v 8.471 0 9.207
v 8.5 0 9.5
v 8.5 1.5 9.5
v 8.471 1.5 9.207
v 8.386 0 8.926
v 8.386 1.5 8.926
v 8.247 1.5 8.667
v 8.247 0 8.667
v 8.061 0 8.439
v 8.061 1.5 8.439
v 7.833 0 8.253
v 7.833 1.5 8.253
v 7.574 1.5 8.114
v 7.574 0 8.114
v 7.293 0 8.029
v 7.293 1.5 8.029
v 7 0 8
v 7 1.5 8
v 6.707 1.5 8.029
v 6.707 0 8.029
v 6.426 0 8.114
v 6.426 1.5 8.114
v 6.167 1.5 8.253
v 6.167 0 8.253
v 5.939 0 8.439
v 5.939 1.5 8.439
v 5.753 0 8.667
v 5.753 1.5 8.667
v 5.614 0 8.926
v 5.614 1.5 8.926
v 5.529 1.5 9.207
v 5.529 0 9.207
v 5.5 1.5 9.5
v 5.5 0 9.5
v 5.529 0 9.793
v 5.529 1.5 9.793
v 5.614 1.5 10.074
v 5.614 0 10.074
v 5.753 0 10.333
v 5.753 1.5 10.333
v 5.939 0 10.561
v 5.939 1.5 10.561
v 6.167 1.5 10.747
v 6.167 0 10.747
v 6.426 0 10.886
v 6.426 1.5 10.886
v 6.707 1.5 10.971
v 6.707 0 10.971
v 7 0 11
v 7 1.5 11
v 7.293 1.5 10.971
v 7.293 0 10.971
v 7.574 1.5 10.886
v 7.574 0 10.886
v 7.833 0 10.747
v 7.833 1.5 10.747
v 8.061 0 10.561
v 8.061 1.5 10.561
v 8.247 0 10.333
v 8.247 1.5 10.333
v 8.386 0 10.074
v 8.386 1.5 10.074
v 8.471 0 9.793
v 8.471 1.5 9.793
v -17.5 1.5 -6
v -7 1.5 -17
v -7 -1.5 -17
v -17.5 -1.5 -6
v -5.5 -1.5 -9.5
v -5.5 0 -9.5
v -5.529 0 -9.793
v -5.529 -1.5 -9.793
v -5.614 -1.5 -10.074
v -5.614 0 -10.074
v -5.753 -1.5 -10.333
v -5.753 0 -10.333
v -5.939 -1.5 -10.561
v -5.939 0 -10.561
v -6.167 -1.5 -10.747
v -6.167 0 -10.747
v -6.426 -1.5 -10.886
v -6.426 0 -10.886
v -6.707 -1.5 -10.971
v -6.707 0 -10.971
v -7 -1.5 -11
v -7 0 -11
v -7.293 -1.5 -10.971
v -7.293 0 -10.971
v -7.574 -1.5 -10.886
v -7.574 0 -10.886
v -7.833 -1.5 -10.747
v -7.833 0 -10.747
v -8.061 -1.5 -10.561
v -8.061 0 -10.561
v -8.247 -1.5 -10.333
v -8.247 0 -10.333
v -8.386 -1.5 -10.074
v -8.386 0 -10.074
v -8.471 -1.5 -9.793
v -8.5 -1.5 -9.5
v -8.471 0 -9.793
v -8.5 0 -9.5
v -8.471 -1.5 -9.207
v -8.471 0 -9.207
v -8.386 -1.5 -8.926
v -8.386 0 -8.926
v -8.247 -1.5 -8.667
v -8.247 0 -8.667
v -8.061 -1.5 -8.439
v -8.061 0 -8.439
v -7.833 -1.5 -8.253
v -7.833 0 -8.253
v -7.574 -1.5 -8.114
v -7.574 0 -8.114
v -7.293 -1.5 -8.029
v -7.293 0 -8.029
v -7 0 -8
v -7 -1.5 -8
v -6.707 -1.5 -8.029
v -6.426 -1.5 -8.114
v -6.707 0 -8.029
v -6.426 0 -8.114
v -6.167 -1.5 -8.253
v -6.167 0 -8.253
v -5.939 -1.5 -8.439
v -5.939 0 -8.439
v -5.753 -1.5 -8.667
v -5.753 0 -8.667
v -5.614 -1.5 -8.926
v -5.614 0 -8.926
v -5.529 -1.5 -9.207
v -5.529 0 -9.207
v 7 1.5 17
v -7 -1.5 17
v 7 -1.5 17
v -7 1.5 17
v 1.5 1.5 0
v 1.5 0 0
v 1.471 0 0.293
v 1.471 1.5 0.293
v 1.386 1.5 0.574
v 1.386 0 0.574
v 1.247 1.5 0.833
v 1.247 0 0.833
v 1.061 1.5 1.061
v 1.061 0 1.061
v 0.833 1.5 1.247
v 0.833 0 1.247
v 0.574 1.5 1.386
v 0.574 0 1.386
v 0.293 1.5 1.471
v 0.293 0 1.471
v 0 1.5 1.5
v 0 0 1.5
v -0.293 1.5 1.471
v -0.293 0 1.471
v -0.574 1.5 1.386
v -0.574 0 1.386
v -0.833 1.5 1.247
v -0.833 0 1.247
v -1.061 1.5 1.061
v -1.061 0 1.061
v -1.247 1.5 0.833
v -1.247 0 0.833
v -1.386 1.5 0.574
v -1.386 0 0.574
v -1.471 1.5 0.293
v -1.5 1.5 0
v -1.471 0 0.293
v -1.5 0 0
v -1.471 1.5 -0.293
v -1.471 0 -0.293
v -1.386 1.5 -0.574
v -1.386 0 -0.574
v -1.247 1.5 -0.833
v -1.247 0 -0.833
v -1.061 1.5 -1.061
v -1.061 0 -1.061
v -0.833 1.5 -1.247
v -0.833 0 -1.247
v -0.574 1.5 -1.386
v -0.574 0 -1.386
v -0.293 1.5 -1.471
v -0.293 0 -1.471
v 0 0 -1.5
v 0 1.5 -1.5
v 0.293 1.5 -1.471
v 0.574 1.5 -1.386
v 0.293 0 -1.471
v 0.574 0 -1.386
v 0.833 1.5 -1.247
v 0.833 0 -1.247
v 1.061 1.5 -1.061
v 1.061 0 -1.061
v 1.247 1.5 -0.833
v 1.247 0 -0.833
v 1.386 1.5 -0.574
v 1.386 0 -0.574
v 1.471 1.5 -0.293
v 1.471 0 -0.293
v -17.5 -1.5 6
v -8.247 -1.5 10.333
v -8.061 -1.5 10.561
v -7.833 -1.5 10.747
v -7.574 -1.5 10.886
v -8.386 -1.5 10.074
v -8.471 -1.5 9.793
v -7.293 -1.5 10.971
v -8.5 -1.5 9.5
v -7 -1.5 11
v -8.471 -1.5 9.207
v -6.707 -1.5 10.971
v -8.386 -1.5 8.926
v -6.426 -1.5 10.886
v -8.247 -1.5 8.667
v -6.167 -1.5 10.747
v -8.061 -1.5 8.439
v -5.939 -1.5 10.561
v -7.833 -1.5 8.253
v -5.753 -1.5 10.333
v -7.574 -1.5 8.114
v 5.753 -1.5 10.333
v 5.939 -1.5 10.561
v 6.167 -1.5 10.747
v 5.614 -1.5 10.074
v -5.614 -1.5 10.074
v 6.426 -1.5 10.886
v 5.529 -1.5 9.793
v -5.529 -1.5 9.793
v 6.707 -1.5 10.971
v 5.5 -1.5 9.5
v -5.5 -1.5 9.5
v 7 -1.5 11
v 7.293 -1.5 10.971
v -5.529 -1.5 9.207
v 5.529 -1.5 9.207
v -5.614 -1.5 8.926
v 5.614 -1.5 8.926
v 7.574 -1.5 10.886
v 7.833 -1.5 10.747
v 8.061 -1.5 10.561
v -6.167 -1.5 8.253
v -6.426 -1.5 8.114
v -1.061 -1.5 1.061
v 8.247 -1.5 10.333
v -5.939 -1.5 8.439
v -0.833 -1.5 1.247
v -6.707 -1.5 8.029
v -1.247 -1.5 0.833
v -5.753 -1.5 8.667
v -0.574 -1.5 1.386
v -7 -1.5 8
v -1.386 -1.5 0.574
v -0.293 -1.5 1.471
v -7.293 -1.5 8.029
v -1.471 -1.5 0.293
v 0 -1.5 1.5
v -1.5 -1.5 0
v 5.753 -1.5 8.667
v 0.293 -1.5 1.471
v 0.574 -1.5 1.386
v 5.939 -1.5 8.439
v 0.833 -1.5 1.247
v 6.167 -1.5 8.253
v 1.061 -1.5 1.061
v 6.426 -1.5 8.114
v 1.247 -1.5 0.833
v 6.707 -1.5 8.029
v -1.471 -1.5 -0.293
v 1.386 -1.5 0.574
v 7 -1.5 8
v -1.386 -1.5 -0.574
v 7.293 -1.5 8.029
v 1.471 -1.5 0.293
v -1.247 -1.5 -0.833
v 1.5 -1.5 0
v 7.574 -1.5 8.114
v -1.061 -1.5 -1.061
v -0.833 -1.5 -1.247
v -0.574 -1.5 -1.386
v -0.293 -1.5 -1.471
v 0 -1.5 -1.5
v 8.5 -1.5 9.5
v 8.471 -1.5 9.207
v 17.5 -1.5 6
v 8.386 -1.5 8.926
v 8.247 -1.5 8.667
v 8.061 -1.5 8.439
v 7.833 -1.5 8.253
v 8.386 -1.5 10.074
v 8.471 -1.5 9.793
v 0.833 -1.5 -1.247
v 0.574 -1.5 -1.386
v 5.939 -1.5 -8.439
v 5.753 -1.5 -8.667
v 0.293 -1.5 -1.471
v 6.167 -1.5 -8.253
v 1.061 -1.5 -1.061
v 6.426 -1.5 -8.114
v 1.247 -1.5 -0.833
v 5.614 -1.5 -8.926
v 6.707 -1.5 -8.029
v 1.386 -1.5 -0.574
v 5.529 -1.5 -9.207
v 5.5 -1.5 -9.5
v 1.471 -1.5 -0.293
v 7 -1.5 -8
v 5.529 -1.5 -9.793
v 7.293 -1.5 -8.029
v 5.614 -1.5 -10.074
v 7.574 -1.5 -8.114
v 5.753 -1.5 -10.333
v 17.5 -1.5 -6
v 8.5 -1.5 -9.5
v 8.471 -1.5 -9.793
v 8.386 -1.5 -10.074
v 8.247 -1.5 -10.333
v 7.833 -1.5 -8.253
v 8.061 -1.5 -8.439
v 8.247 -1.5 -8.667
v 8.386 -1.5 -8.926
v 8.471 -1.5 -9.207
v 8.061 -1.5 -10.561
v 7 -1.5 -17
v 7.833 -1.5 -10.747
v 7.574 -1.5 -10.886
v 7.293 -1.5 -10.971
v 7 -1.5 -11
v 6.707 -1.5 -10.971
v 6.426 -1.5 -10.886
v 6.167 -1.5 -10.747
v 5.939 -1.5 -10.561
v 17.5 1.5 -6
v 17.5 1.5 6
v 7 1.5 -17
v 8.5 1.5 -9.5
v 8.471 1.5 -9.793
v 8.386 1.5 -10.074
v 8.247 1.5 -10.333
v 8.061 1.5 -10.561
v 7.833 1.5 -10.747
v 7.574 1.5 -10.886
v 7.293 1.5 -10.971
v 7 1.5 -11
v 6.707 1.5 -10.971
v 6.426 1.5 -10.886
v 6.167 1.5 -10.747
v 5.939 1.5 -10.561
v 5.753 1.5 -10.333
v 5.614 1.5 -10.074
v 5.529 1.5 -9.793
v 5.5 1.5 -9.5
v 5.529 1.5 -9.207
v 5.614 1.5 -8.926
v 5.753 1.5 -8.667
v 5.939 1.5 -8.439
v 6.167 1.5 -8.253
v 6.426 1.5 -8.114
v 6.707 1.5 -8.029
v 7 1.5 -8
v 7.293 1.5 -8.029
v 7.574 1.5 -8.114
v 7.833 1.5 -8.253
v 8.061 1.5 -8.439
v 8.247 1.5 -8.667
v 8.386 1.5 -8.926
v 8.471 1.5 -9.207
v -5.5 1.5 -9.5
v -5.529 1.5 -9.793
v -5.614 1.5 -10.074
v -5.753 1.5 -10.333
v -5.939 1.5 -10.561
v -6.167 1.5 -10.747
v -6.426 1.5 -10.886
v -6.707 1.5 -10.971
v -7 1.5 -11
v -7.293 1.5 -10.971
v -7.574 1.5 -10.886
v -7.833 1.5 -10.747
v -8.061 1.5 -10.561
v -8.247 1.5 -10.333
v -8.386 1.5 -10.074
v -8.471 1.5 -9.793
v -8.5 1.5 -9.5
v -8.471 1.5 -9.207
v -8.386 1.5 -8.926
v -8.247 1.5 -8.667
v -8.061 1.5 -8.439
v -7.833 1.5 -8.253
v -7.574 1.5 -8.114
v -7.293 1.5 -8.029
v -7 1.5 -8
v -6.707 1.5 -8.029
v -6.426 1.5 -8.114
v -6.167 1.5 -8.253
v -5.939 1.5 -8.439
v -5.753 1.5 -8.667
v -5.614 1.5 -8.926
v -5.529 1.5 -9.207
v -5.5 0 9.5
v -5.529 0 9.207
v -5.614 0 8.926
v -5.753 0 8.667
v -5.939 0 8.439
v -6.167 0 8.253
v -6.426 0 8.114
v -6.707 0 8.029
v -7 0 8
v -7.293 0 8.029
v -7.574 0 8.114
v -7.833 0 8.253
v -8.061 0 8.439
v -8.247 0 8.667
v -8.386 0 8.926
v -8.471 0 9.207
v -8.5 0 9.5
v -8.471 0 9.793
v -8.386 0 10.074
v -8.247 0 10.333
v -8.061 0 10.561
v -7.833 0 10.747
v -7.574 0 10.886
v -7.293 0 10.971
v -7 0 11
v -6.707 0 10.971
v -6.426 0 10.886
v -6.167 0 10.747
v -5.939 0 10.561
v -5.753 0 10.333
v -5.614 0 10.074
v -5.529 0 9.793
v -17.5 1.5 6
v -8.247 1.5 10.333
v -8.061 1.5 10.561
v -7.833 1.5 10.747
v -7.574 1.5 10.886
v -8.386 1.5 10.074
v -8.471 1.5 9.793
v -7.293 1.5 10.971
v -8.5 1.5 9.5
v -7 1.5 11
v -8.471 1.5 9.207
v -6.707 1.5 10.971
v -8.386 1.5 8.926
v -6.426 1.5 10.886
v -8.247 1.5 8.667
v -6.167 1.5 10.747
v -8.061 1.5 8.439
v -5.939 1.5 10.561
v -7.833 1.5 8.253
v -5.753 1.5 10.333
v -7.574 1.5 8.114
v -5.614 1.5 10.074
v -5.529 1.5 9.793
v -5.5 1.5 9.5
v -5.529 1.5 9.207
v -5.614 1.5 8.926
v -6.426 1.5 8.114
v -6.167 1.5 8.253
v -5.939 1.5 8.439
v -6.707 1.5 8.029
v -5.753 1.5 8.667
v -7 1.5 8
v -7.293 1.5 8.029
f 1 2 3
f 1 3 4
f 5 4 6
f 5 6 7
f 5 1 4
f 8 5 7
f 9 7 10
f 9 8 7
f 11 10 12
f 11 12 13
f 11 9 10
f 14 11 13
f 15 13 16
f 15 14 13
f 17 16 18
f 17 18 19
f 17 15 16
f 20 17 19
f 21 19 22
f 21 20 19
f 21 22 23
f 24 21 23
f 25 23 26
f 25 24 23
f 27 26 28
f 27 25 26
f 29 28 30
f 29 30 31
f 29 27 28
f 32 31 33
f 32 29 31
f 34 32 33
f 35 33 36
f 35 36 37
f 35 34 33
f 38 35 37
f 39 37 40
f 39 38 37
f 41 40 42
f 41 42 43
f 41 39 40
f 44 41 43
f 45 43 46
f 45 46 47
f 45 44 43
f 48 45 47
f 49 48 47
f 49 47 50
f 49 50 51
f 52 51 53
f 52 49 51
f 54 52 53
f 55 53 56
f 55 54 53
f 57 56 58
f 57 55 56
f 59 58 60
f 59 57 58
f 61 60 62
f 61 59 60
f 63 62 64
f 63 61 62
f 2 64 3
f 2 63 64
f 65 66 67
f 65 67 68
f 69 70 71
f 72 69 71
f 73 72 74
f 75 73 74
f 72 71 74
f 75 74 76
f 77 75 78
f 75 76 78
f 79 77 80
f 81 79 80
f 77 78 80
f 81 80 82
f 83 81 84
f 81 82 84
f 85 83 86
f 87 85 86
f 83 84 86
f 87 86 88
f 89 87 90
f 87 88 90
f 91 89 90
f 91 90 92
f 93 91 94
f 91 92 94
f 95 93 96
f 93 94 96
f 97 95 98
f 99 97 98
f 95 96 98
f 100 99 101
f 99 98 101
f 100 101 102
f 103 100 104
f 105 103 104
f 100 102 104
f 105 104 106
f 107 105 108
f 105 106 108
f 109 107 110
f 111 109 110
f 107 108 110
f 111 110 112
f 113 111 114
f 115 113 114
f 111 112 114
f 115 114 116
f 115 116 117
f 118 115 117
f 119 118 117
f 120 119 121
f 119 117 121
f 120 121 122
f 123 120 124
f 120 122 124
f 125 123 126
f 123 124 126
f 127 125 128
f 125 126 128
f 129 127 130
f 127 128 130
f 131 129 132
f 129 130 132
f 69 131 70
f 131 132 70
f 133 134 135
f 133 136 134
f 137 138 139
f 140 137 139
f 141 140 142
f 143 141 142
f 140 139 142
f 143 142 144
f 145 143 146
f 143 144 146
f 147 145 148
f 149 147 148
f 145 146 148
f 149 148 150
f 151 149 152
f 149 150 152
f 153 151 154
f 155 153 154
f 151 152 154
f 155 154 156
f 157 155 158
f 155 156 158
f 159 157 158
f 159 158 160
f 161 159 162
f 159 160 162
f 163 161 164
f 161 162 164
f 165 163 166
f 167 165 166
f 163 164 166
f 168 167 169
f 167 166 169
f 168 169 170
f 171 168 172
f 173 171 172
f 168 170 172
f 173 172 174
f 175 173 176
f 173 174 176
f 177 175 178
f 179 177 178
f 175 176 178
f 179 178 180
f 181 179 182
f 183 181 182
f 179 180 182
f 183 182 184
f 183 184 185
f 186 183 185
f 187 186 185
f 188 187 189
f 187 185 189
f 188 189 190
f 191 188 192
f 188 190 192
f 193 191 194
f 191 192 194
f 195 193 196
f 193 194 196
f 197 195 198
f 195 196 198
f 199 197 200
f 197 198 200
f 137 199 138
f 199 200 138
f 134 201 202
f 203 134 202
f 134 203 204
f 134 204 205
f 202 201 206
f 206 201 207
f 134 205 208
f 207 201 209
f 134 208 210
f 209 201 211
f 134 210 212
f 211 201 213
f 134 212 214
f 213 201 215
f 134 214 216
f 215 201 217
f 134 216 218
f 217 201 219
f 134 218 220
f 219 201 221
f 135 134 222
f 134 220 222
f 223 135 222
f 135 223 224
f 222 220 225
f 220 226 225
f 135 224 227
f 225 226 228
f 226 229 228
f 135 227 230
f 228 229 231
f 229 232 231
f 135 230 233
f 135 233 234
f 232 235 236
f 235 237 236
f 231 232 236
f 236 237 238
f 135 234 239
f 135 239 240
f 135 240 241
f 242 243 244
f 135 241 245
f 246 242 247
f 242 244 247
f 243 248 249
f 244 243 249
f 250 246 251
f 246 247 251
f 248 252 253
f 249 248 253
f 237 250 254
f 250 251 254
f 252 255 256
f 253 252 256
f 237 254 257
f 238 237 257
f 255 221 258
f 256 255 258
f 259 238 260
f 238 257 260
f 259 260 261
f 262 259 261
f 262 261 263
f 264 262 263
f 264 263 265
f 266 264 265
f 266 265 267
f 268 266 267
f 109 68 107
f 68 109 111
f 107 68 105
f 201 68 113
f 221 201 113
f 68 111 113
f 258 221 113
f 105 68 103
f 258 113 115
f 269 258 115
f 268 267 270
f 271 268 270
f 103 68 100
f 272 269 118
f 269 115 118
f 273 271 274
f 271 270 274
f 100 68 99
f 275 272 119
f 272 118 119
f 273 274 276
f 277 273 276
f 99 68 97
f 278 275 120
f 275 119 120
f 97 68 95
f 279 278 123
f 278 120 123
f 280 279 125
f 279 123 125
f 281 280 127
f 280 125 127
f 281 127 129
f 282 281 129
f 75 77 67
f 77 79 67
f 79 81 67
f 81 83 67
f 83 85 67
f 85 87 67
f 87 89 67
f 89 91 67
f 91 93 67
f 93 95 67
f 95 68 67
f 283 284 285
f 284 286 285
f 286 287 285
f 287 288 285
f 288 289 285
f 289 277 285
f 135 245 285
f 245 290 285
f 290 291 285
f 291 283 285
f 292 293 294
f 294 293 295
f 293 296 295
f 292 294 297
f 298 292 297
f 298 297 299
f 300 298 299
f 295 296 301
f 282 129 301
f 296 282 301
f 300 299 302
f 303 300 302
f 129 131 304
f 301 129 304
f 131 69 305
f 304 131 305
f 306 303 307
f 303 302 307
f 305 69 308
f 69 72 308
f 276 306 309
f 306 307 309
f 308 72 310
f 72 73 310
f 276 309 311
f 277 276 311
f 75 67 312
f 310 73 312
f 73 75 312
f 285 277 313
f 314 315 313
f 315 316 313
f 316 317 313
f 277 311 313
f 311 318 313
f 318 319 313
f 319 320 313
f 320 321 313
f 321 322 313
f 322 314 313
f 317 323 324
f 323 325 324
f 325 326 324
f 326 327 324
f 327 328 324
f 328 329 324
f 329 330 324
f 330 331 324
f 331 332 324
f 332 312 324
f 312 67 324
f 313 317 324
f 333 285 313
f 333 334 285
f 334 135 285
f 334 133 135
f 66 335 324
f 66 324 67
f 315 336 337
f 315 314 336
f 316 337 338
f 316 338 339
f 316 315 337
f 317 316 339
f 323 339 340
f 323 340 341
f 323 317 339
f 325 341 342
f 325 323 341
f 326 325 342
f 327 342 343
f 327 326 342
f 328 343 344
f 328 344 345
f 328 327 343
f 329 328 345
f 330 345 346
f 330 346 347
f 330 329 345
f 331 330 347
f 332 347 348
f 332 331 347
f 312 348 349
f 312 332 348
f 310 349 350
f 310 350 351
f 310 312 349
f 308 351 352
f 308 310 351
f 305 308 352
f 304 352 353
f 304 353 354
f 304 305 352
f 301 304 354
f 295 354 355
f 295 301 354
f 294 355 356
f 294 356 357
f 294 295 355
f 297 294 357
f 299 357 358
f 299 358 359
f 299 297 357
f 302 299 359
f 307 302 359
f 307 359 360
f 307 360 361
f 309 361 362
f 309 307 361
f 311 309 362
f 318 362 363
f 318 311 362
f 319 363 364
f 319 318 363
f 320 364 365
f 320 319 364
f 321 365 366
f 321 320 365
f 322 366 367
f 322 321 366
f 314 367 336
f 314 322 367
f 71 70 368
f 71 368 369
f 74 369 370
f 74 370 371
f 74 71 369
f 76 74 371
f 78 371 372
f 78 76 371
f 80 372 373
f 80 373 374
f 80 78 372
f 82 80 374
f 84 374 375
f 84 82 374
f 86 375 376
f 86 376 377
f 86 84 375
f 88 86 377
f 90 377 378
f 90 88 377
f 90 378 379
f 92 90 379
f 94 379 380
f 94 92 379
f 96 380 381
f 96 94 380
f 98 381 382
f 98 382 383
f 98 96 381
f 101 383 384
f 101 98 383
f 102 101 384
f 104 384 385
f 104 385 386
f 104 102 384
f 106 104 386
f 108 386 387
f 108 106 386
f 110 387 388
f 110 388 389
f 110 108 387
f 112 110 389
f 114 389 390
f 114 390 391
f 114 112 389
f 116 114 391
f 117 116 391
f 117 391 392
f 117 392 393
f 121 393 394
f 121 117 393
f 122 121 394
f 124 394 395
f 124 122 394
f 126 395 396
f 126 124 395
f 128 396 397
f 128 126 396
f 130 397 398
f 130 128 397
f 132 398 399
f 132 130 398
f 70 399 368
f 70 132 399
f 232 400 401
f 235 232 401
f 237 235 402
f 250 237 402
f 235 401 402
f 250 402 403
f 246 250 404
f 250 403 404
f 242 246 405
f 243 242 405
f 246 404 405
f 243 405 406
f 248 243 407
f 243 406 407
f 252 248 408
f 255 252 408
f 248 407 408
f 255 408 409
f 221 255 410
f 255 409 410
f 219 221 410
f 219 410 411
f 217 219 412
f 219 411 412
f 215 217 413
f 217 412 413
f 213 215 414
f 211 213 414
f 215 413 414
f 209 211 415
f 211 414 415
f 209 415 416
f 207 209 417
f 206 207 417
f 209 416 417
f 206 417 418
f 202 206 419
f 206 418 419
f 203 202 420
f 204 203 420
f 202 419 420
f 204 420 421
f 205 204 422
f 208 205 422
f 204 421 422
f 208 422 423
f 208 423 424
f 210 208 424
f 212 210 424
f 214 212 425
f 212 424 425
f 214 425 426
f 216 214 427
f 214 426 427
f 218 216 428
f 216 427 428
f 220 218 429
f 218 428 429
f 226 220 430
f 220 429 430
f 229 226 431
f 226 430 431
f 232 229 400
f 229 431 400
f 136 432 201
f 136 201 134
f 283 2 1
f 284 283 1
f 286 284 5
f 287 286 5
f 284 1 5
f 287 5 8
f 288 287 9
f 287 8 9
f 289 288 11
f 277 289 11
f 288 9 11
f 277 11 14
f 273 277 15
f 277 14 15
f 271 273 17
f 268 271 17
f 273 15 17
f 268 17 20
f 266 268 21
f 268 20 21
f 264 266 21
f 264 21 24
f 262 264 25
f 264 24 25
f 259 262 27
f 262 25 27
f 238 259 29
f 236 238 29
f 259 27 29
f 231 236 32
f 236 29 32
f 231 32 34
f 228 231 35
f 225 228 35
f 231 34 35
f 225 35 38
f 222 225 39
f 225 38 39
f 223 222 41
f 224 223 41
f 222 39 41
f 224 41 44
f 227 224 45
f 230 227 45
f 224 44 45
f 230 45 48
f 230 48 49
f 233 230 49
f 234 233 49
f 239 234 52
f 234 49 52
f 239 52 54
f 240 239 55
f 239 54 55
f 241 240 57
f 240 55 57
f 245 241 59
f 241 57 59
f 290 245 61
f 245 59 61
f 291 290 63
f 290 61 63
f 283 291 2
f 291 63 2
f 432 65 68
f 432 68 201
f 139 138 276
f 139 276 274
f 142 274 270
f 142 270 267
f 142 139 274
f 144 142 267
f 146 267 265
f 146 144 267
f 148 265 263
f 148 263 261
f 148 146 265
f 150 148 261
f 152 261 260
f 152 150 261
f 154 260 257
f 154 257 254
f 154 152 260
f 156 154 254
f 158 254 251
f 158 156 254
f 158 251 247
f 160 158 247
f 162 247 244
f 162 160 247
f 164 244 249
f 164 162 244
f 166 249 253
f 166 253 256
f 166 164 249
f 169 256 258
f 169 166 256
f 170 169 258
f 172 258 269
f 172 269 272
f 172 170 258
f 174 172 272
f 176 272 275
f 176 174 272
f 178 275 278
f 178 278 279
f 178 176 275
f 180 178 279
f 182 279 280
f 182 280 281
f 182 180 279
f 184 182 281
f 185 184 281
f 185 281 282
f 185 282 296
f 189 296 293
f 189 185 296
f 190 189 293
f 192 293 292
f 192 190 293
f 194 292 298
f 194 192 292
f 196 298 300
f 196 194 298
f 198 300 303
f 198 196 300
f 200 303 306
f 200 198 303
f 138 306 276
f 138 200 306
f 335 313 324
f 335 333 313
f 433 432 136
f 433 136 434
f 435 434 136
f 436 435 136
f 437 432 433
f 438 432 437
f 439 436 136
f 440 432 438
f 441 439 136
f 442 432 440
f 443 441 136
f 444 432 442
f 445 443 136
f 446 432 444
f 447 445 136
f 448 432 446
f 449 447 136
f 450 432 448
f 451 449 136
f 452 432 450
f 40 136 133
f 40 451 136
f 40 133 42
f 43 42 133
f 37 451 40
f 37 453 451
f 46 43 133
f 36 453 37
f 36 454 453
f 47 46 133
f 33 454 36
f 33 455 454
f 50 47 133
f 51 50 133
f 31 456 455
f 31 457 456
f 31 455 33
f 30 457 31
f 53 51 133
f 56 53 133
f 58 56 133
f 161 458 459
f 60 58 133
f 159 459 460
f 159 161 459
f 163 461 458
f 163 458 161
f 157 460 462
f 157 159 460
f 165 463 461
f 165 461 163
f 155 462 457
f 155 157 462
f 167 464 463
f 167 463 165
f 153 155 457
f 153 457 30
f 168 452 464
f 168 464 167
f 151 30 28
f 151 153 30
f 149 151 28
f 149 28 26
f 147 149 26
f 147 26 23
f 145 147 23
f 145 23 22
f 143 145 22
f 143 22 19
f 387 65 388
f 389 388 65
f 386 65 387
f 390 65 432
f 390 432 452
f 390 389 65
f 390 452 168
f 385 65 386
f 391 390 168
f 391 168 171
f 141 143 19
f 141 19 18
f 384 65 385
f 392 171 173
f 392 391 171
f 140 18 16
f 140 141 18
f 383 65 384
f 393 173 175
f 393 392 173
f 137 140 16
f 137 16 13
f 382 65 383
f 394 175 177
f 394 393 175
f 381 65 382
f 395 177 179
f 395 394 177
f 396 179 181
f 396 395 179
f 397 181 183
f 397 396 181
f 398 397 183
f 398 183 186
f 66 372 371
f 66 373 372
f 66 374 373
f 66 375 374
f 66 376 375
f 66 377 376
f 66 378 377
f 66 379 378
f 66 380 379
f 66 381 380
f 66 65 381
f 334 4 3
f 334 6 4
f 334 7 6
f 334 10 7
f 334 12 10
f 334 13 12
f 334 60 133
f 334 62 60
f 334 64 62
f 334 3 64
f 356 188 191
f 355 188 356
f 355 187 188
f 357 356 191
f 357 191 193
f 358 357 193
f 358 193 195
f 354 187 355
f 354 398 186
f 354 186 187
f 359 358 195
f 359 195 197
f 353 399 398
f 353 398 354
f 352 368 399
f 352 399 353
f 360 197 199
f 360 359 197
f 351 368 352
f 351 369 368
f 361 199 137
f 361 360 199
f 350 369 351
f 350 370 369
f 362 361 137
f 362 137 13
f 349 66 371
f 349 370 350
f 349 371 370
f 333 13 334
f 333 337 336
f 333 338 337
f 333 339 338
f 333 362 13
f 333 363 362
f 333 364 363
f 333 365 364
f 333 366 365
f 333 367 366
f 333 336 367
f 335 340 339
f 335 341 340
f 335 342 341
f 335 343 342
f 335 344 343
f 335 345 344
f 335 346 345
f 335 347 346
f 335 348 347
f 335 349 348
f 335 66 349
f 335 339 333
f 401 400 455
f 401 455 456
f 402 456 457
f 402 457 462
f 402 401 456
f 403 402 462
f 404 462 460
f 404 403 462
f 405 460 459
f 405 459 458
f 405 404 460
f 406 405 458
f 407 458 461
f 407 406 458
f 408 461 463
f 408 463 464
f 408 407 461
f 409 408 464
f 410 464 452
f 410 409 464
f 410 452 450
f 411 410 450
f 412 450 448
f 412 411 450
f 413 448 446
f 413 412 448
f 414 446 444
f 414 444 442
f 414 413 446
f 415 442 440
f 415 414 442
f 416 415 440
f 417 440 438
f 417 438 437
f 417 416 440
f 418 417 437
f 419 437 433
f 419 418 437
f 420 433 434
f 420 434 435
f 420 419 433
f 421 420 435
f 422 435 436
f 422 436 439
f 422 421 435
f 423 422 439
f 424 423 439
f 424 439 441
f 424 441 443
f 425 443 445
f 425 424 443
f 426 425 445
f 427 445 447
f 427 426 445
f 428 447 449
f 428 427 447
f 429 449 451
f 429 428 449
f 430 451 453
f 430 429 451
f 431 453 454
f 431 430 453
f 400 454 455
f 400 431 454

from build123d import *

# Parameters (mm, degrees)
SKETCH1_R           = 1.5
BOSS_EXTRUDE1_DEPTH = 1.5


with BuildPart() as part:
    # Sketch1 → Boss-Extrude1 (new body, symmetric)
    with BuildSketch(Plane(origin=(0, 0, 0), x_dir=(1, 0, 0), z_dir=(0, 1, 0))):
        with BuildLine():
            Line((1.5, 0), (17.5, 0))
            Line((17.5, 0), (17.5, 6))
            Line((17.5, 6), (7, 17))
            Line((7, 17), (0, 17))
            Line((0, 17), (-7, 17))
            Line((-7, 17), (-17.5, 6))
            Line((-17.5, 6), (-17.5, 0))
            Line((-17.5, 0), (-1.5, 0))
            ThreePointArc((-1.5, 0), (0, 1.5), (1.5, 0))
        make_face()
        with Locations((-7, 9.5)):
            Circle(SKETCH1_R, mode=Mode.SUBTRACT)
        with Locations((7, 9.5)):
            Circle(SKETCH1_R, mode=Mode.SUBTRACT)
        with BuildLine():
            Line((7, -17), (17.5, -6))
            Line((17.5, -6), (17.5, 0))
            Line((17.5, 0), (1.5, 0))
            ThreePointArc((1.5, 0), (0, -1.5), (-1.5, 0))
            Line((-1.5, 0), (-17.5, 0))
            Line((-17.5, 0), (-17.5, -6))
            Line((-17.5, -6), (-7, -17))
            Line((-7, -17), (0, -17))
            Line((0, -17), (7, -17))
        make_face()
        with Locations((-7, -9.5)):
            Circle(SKETCH1_R, mode=Mode.SUBTRACT)
        with Locations((7, -9.5)):
            Circle(SKETCH1_R, mode=Mode.SUBTRACT)
    extrude(amount=BOSS_EXTRUDE1_DEPTH, both=True)


solid = part.part
